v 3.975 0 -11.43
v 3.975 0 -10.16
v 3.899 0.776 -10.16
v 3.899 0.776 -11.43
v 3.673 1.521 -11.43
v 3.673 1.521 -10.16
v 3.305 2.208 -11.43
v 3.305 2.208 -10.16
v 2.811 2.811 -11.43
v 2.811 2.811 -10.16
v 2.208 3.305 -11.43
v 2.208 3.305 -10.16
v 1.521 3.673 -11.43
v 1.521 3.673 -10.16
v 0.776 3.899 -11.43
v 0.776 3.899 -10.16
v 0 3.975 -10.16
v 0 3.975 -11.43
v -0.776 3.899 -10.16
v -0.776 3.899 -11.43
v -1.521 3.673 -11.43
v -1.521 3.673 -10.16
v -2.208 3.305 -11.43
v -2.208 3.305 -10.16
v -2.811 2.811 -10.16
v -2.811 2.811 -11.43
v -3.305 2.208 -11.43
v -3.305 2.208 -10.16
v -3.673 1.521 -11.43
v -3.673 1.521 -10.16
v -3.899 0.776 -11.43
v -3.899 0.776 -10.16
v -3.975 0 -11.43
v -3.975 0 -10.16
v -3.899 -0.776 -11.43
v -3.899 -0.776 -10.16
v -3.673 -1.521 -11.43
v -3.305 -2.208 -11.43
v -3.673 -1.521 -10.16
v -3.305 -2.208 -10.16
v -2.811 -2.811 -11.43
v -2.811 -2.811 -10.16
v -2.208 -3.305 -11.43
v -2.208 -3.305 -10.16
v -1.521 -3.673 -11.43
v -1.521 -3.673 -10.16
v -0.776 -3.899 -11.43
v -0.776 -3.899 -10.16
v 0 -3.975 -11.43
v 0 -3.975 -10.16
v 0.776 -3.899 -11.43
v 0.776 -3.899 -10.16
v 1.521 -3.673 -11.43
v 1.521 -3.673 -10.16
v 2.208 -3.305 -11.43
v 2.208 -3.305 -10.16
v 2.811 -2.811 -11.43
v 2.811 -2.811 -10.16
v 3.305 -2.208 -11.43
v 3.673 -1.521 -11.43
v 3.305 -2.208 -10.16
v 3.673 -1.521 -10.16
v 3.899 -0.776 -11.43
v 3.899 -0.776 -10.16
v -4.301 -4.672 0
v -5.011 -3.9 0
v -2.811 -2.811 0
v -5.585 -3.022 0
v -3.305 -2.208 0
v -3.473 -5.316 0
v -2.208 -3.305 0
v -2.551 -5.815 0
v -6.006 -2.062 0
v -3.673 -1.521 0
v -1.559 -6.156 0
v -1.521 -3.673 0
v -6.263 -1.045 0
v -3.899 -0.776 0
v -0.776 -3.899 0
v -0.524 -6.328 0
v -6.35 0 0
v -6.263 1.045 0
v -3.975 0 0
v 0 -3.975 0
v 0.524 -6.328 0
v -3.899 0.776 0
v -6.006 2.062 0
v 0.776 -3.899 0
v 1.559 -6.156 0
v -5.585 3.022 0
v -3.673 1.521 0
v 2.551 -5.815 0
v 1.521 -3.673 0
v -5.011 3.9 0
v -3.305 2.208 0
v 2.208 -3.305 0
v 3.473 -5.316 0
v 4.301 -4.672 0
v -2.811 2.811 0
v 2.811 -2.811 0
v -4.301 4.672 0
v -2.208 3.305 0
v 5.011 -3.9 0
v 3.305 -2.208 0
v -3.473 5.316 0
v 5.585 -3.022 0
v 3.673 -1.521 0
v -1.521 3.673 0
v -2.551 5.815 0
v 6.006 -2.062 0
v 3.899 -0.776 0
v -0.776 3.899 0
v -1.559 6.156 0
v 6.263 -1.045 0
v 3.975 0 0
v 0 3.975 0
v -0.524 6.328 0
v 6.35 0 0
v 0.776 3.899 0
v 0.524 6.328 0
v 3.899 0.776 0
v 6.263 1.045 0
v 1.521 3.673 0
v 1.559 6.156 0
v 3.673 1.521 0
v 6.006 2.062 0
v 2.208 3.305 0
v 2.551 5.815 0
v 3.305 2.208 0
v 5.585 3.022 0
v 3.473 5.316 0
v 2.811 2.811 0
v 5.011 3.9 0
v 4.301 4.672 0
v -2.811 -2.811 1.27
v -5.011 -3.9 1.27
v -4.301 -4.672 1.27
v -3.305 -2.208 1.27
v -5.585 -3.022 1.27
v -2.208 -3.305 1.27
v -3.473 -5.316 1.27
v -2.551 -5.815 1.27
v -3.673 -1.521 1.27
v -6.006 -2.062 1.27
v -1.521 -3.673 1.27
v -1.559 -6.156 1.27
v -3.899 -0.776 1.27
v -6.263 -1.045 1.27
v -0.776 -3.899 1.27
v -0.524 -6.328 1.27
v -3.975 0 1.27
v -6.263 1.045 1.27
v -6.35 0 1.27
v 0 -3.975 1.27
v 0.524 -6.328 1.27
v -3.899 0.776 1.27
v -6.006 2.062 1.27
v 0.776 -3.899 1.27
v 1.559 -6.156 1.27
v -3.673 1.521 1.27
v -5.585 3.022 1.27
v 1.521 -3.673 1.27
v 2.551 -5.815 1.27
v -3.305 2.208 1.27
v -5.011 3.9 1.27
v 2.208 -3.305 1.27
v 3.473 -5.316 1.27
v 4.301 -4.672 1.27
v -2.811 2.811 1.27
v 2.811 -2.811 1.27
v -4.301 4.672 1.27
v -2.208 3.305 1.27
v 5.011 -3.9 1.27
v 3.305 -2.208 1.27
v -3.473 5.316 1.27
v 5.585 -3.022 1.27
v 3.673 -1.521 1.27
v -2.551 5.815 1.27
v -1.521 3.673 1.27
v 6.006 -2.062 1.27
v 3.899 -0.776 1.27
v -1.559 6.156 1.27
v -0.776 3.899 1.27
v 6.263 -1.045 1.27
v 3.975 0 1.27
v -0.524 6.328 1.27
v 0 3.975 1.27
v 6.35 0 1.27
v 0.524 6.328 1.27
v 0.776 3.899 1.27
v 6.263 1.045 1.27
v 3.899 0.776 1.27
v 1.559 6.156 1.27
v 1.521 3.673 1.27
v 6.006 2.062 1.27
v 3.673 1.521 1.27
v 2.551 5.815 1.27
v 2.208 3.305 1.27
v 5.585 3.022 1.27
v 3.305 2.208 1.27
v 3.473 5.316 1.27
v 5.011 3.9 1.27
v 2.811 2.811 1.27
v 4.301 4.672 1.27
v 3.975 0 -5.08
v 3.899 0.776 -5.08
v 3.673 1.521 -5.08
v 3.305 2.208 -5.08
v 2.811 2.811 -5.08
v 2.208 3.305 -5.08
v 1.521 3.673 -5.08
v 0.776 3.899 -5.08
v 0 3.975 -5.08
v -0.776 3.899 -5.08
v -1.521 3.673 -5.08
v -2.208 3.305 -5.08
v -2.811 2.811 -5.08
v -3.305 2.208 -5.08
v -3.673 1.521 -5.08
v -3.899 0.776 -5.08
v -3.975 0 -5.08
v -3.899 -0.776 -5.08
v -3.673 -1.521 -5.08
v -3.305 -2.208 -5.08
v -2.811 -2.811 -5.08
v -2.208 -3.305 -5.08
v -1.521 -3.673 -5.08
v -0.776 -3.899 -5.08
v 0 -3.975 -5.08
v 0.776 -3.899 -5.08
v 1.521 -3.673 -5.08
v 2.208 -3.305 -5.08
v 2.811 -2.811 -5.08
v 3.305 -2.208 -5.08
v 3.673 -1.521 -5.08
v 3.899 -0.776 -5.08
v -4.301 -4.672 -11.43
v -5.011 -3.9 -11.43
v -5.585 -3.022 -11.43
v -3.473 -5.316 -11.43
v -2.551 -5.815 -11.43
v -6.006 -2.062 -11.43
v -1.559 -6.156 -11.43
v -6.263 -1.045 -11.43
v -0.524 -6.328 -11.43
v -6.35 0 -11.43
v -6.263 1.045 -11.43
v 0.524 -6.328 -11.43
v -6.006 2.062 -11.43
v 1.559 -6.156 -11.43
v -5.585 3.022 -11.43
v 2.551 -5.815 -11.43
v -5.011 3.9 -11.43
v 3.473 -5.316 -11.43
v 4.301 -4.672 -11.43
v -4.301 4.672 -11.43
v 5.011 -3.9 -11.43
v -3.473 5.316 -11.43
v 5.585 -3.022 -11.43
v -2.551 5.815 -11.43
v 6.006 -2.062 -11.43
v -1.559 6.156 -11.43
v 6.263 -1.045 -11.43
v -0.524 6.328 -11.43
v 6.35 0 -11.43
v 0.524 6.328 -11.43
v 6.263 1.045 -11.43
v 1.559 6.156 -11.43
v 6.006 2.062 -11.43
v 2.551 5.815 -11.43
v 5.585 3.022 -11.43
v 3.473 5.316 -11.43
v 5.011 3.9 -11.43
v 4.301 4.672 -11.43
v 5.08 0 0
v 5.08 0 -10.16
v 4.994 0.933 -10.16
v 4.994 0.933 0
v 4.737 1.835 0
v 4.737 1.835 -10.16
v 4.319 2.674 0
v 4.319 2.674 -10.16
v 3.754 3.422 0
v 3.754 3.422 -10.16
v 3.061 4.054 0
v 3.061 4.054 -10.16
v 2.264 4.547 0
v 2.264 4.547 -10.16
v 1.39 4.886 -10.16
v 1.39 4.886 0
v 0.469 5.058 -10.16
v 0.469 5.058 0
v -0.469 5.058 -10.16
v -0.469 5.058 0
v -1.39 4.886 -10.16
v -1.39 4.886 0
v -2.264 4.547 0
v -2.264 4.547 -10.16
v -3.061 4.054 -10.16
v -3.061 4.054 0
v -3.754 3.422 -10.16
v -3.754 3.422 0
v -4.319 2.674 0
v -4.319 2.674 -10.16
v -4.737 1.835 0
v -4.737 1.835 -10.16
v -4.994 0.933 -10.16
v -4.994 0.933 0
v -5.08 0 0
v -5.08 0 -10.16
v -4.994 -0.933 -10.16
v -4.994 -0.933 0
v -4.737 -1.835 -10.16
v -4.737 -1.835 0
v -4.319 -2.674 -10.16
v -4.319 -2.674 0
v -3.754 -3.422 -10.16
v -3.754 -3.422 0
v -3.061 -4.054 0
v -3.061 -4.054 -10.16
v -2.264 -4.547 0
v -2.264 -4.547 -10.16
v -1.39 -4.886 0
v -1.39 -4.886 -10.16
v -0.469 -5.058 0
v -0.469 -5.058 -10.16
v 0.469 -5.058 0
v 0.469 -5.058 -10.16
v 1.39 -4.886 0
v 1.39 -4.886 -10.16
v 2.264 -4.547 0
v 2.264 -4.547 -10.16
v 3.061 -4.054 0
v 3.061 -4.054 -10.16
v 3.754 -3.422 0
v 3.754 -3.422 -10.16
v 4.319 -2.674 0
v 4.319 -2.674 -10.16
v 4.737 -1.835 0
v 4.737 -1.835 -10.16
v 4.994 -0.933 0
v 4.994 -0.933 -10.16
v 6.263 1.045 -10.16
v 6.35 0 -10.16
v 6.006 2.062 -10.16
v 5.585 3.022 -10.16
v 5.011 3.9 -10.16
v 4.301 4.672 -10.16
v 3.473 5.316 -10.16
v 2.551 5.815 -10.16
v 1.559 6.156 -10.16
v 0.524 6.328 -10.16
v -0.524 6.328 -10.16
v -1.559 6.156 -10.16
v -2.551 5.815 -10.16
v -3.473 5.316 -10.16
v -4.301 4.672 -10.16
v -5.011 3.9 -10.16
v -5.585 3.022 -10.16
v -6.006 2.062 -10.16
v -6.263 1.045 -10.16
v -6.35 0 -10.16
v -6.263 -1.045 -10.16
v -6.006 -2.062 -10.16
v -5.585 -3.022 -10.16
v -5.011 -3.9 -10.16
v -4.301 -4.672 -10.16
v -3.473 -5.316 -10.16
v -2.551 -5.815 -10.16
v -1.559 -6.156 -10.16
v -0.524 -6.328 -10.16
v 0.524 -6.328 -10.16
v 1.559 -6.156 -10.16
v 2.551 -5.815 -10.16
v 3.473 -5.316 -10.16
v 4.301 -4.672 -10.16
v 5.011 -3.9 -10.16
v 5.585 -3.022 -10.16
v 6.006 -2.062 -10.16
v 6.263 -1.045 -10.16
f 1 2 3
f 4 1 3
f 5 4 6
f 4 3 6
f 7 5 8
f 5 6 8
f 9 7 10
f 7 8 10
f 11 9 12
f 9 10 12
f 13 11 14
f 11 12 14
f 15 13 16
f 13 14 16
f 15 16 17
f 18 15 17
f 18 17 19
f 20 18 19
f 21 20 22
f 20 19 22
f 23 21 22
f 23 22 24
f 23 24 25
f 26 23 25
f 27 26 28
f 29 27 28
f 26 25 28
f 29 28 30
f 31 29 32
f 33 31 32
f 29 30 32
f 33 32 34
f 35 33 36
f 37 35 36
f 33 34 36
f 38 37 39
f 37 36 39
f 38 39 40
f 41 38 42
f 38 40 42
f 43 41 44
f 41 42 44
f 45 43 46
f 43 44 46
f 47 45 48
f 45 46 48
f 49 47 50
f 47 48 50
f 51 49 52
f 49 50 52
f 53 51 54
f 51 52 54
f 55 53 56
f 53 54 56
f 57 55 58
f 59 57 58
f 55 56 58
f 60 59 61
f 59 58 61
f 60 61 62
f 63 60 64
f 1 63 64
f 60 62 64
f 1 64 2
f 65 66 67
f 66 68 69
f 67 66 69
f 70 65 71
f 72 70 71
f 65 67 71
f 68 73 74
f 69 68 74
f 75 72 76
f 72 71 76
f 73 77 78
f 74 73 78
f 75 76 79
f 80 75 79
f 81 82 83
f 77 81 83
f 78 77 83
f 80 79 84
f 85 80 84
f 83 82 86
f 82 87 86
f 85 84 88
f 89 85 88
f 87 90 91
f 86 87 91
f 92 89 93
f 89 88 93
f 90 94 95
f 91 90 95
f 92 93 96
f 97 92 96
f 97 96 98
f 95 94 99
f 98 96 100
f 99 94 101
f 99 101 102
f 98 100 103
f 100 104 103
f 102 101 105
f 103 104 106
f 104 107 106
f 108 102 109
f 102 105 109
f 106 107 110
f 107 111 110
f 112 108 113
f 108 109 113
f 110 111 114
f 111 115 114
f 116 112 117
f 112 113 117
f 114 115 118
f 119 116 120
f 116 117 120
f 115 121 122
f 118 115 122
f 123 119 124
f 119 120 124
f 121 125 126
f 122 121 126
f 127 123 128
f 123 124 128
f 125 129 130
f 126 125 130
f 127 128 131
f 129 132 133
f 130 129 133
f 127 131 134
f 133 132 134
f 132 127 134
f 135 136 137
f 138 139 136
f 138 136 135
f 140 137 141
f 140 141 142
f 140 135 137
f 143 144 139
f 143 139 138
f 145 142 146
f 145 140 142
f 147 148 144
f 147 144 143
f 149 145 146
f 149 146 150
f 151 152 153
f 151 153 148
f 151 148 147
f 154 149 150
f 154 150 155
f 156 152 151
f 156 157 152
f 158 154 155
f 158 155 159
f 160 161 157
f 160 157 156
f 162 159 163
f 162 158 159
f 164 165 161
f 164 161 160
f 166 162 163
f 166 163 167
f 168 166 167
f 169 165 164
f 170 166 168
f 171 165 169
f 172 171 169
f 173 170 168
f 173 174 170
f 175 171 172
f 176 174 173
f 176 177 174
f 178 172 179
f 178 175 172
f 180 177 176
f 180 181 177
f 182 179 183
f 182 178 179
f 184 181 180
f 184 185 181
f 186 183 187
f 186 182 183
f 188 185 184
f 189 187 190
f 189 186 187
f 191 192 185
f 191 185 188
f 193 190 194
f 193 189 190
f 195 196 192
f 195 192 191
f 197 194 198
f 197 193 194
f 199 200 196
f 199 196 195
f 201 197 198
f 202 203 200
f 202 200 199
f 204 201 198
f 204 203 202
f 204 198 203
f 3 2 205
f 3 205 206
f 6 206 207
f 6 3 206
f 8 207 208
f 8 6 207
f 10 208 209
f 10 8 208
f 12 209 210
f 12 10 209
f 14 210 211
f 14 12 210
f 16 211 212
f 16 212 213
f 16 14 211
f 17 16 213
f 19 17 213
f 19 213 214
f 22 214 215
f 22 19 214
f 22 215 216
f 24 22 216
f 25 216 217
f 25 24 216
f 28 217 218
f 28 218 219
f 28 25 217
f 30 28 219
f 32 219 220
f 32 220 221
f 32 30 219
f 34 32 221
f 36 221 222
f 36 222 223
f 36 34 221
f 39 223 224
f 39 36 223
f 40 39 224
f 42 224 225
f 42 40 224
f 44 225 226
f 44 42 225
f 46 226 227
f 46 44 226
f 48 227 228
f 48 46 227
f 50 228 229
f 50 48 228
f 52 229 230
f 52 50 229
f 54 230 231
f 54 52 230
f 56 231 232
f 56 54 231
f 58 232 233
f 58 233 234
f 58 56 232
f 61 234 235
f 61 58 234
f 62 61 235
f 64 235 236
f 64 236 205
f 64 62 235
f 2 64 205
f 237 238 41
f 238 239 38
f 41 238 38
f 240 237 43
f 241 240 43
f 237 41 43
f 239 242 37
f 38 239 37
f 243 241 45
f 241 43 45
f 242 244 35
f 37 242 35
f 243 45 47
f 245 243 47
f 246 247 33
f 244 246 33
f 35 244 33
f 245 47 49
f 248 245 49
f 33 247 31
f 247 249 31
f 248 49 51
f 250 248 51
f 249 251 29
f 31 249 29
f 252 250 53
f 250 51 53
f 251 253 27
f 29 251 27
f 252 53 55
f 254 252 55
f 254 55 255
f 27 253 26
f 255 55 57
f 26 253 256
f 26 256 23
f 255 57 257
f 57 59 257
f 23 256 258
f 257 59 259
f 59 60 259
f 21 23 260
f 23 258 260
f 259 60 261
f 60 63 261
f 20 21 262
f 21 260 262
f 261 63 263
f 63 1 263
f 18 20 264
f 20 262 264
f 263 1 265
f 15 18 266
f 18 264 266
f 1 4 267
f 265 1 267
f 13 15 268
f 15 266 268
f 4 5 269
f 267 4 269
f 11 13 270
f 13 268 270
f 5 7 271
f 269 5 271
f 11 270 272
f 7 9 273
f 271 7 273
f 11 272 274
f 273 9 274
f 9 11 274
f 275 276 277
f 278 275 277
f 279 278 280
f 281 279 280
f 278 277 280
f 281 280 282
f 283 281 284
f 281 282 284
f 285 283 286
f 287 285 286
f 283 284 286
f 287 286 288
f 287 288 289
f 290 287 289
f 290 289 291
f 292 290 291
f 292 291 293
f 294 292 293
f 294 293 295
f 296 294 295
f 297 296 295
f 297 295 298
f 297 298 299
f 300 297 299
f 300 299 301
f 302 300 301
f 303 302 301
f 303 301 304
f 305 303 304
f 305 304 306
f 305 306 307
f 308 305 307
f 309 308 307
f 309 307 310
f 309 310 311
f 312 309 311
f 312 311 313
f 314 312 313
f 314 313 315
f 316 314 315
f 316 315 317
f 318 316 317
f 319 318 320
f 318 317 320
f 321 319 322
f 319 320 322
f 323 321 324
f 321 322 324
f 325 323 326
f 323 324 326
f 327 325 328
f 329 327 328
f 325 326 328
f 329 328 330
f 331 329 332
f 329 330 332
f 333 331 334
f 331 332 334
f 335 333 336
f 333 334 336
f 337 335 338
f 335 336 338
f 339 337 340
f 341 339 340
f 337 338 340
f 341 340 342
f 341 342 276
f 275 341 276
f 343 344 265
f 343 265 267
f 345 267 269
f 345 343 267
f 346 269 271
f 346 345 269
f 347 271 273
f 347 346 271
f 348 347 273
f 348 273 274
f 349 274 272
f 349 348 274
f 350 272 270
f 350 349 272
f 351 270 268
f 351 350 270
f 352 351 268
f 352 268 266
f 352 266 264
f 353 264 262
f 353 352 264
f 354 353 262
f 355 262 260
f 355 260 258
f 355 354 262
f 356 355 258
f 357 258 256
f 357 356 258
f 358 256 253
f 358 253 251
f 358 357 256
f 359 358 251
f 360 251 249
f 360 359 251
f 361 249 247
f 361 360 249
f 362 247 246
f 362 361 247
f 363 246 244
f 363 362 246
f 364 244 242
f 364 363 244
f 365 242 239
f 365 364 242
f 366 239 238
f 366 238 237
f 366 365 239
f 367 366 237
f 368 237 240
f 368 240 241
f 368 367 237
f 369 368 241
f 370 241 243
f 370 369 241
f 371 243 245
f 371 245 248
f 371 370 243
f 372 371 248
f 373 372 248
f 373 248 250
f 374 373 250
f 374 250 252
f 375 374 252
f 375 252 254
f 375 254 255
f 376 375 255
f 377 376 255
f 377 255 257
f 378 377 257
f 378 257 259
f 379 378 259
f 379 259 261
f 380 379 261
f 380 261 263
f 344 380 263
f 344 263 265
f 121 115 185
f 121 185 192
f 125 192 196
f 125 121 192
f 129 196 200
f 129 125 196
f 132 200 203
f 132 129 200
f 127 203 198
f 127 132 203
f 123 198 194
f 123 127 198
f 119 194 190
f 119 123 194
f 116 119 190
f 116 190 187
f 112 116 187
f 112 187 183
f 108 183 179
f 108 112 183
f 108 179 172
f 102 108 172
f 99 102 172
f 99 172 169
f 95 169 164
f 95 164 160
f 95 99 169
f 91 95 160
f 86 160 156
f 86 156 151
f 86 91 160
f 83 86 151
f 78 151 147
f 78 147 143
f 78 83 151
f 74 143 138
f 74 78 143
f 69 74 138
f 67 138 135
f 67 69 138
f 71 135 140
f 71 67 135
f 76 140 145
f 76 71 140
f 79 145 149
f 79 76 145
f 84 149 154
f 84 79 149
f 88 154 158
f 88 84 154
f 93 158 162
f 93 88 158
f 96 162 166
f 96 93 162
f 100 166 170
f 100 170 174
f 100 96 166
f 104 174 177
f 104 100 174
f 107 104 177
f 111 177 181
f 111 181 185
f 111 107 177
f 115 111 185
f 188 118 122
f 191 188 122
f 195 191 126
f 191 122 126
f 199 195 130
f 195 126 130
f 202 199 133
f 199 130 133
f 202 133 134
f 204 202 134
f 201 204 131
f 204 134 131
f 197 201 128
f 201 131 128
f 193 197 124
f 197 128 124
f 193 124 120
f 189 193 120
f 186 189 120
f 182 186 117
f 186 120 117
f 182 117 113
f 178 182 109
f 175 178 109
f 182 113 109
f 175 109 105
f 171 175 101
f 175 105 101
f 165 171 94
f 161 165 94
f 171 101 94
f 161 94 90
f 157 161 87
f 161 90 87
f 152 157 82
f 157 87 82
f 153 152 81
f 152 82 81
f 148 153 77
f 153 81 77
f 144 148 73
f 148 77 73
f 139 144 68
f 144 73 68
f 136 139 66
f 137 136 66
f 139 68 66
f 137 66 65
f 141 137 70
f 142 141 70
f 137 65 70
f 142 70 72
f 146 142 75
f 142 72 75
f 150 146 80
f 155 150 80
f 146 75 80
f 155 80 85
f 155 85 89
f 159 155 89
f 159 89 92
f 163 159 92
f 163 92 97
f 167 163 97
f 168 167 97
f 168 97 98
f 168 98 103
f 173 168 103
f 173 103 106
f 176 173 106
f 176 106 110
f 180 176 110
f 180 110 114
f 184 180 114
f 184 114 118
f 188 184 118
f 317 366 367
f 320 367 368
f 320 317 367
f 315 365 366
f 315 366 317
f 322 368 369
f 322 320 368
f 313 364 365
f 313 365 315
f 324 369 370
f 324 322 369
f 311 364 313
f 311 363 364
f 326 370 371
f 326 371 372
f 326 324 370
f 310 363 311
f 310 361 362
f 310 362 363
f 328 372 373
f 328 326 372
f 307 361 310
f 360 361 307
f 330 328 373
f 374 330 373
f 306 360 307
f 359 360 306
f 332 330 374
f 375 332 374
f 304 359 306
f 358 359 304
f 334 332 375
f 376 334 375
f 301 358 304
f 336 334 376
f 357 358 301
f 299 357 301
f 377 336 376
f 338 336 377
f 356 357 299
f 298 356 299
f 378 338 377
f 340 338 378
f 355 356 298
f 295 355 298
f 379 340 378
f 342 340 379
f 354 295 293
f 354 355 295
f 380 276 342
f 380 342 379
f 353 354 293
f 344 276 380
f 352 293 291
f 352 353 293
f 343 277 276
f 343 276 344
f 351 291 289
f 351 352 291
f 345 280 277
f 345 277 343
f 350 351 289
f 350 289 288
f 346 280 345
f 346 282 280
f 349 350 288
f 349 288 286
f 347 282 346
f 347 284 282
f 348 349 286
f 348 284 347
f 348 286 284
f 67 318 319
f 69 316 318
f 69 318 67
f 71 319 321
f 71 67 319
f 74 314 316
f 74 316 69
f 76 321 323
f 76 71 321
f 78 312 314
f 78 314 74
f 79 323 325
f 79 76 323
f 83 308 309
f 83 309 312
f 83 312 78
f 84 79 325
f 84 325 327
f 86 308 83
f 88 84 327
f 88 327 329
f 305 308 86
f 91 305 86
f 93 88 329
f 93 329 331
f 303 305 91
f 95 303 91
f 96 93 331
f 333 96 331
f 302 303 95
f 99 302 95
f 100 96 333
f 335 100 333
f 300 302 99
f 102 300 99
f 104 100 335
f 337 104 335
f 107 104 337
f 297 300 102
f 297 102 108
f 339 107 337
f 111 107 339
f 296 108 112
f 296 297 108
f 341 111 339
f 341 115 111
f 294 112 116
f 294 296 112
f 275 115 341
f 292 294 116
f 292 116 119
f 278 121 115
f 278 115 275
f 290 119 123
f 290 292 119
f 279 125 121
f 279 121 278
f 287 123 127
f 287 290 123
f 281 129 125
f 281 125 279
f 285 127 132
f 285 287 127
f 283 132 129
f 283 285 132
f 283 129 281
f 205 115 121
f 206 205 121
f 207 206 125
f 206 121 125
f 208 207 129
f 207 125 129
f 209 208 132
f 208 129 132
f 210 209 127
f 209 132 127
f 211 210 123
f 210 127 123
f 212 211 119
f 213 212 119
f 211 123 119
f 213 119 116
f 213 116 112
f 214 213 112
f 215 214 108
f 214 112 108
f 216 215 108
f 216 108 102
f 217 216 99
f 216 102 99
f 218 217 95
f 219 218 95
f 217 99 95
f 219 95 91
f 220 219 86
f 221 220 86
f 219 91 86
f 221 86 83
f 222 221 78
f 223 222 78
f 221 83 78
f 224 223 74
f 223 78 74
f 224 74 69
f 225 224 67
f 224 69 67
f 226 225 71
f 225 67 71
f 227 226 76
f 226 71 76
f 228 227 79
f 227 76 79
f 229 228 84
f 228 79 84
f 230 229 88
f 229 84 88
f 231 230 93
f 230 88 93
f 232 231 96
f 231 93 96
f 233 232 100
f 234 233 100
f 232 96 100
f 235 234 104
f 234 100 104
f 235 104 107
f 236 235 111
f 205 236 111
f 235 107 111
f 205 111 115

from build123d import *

# Parameters (mm, degrees)
SKETCH1_R           = 5.08
SKETCH1_R_2         = 3.9751
BOSS_EXTRUDE1_DEPTH = 5.08
SKETCH2_R           = 6.35
SKETCH2_R_2         = 3.9751
BOSS_EXTRUDE2_DEPTH = 1.27


with BuildPart() as part:
    # Sketch1 → Boss-Extrude1 (new body)
    with BuildSketch(Plane.XY):
        Circle(SKETCH1_R)
        Circle(SKETCH1_R_2, mode=Mode.SUBTRACT)
    boss_extrude1 = extrude(amount=-BOSS_EXTRUDE1_DEPTH)


with BuildPart() as body_2:
    # Sketch2 → Boss-Extrude2 (new body)
    with BuildSketch(Plane.XY):
        Circle(SKETCH2_R)
        Circle(SKETCH2_R_2, mode=Mode.SUBTRACT)
    boss_extrude2 = extrude(amount=BOSS_EXTRUDE2_DEPTH)


with BuildPart() as part_1:
    add(part.part)

    # Mirror1: Boss-Extrude1, Boss-Extrude2 across plane
    add(boss_extrude1.mirror(Plane.XY.offset(-5.08)))
    add(boss_extrude2.mirror(Plane.XY.offset(-5.08)))


solid = Compound([body_2.part, part_1.part])
